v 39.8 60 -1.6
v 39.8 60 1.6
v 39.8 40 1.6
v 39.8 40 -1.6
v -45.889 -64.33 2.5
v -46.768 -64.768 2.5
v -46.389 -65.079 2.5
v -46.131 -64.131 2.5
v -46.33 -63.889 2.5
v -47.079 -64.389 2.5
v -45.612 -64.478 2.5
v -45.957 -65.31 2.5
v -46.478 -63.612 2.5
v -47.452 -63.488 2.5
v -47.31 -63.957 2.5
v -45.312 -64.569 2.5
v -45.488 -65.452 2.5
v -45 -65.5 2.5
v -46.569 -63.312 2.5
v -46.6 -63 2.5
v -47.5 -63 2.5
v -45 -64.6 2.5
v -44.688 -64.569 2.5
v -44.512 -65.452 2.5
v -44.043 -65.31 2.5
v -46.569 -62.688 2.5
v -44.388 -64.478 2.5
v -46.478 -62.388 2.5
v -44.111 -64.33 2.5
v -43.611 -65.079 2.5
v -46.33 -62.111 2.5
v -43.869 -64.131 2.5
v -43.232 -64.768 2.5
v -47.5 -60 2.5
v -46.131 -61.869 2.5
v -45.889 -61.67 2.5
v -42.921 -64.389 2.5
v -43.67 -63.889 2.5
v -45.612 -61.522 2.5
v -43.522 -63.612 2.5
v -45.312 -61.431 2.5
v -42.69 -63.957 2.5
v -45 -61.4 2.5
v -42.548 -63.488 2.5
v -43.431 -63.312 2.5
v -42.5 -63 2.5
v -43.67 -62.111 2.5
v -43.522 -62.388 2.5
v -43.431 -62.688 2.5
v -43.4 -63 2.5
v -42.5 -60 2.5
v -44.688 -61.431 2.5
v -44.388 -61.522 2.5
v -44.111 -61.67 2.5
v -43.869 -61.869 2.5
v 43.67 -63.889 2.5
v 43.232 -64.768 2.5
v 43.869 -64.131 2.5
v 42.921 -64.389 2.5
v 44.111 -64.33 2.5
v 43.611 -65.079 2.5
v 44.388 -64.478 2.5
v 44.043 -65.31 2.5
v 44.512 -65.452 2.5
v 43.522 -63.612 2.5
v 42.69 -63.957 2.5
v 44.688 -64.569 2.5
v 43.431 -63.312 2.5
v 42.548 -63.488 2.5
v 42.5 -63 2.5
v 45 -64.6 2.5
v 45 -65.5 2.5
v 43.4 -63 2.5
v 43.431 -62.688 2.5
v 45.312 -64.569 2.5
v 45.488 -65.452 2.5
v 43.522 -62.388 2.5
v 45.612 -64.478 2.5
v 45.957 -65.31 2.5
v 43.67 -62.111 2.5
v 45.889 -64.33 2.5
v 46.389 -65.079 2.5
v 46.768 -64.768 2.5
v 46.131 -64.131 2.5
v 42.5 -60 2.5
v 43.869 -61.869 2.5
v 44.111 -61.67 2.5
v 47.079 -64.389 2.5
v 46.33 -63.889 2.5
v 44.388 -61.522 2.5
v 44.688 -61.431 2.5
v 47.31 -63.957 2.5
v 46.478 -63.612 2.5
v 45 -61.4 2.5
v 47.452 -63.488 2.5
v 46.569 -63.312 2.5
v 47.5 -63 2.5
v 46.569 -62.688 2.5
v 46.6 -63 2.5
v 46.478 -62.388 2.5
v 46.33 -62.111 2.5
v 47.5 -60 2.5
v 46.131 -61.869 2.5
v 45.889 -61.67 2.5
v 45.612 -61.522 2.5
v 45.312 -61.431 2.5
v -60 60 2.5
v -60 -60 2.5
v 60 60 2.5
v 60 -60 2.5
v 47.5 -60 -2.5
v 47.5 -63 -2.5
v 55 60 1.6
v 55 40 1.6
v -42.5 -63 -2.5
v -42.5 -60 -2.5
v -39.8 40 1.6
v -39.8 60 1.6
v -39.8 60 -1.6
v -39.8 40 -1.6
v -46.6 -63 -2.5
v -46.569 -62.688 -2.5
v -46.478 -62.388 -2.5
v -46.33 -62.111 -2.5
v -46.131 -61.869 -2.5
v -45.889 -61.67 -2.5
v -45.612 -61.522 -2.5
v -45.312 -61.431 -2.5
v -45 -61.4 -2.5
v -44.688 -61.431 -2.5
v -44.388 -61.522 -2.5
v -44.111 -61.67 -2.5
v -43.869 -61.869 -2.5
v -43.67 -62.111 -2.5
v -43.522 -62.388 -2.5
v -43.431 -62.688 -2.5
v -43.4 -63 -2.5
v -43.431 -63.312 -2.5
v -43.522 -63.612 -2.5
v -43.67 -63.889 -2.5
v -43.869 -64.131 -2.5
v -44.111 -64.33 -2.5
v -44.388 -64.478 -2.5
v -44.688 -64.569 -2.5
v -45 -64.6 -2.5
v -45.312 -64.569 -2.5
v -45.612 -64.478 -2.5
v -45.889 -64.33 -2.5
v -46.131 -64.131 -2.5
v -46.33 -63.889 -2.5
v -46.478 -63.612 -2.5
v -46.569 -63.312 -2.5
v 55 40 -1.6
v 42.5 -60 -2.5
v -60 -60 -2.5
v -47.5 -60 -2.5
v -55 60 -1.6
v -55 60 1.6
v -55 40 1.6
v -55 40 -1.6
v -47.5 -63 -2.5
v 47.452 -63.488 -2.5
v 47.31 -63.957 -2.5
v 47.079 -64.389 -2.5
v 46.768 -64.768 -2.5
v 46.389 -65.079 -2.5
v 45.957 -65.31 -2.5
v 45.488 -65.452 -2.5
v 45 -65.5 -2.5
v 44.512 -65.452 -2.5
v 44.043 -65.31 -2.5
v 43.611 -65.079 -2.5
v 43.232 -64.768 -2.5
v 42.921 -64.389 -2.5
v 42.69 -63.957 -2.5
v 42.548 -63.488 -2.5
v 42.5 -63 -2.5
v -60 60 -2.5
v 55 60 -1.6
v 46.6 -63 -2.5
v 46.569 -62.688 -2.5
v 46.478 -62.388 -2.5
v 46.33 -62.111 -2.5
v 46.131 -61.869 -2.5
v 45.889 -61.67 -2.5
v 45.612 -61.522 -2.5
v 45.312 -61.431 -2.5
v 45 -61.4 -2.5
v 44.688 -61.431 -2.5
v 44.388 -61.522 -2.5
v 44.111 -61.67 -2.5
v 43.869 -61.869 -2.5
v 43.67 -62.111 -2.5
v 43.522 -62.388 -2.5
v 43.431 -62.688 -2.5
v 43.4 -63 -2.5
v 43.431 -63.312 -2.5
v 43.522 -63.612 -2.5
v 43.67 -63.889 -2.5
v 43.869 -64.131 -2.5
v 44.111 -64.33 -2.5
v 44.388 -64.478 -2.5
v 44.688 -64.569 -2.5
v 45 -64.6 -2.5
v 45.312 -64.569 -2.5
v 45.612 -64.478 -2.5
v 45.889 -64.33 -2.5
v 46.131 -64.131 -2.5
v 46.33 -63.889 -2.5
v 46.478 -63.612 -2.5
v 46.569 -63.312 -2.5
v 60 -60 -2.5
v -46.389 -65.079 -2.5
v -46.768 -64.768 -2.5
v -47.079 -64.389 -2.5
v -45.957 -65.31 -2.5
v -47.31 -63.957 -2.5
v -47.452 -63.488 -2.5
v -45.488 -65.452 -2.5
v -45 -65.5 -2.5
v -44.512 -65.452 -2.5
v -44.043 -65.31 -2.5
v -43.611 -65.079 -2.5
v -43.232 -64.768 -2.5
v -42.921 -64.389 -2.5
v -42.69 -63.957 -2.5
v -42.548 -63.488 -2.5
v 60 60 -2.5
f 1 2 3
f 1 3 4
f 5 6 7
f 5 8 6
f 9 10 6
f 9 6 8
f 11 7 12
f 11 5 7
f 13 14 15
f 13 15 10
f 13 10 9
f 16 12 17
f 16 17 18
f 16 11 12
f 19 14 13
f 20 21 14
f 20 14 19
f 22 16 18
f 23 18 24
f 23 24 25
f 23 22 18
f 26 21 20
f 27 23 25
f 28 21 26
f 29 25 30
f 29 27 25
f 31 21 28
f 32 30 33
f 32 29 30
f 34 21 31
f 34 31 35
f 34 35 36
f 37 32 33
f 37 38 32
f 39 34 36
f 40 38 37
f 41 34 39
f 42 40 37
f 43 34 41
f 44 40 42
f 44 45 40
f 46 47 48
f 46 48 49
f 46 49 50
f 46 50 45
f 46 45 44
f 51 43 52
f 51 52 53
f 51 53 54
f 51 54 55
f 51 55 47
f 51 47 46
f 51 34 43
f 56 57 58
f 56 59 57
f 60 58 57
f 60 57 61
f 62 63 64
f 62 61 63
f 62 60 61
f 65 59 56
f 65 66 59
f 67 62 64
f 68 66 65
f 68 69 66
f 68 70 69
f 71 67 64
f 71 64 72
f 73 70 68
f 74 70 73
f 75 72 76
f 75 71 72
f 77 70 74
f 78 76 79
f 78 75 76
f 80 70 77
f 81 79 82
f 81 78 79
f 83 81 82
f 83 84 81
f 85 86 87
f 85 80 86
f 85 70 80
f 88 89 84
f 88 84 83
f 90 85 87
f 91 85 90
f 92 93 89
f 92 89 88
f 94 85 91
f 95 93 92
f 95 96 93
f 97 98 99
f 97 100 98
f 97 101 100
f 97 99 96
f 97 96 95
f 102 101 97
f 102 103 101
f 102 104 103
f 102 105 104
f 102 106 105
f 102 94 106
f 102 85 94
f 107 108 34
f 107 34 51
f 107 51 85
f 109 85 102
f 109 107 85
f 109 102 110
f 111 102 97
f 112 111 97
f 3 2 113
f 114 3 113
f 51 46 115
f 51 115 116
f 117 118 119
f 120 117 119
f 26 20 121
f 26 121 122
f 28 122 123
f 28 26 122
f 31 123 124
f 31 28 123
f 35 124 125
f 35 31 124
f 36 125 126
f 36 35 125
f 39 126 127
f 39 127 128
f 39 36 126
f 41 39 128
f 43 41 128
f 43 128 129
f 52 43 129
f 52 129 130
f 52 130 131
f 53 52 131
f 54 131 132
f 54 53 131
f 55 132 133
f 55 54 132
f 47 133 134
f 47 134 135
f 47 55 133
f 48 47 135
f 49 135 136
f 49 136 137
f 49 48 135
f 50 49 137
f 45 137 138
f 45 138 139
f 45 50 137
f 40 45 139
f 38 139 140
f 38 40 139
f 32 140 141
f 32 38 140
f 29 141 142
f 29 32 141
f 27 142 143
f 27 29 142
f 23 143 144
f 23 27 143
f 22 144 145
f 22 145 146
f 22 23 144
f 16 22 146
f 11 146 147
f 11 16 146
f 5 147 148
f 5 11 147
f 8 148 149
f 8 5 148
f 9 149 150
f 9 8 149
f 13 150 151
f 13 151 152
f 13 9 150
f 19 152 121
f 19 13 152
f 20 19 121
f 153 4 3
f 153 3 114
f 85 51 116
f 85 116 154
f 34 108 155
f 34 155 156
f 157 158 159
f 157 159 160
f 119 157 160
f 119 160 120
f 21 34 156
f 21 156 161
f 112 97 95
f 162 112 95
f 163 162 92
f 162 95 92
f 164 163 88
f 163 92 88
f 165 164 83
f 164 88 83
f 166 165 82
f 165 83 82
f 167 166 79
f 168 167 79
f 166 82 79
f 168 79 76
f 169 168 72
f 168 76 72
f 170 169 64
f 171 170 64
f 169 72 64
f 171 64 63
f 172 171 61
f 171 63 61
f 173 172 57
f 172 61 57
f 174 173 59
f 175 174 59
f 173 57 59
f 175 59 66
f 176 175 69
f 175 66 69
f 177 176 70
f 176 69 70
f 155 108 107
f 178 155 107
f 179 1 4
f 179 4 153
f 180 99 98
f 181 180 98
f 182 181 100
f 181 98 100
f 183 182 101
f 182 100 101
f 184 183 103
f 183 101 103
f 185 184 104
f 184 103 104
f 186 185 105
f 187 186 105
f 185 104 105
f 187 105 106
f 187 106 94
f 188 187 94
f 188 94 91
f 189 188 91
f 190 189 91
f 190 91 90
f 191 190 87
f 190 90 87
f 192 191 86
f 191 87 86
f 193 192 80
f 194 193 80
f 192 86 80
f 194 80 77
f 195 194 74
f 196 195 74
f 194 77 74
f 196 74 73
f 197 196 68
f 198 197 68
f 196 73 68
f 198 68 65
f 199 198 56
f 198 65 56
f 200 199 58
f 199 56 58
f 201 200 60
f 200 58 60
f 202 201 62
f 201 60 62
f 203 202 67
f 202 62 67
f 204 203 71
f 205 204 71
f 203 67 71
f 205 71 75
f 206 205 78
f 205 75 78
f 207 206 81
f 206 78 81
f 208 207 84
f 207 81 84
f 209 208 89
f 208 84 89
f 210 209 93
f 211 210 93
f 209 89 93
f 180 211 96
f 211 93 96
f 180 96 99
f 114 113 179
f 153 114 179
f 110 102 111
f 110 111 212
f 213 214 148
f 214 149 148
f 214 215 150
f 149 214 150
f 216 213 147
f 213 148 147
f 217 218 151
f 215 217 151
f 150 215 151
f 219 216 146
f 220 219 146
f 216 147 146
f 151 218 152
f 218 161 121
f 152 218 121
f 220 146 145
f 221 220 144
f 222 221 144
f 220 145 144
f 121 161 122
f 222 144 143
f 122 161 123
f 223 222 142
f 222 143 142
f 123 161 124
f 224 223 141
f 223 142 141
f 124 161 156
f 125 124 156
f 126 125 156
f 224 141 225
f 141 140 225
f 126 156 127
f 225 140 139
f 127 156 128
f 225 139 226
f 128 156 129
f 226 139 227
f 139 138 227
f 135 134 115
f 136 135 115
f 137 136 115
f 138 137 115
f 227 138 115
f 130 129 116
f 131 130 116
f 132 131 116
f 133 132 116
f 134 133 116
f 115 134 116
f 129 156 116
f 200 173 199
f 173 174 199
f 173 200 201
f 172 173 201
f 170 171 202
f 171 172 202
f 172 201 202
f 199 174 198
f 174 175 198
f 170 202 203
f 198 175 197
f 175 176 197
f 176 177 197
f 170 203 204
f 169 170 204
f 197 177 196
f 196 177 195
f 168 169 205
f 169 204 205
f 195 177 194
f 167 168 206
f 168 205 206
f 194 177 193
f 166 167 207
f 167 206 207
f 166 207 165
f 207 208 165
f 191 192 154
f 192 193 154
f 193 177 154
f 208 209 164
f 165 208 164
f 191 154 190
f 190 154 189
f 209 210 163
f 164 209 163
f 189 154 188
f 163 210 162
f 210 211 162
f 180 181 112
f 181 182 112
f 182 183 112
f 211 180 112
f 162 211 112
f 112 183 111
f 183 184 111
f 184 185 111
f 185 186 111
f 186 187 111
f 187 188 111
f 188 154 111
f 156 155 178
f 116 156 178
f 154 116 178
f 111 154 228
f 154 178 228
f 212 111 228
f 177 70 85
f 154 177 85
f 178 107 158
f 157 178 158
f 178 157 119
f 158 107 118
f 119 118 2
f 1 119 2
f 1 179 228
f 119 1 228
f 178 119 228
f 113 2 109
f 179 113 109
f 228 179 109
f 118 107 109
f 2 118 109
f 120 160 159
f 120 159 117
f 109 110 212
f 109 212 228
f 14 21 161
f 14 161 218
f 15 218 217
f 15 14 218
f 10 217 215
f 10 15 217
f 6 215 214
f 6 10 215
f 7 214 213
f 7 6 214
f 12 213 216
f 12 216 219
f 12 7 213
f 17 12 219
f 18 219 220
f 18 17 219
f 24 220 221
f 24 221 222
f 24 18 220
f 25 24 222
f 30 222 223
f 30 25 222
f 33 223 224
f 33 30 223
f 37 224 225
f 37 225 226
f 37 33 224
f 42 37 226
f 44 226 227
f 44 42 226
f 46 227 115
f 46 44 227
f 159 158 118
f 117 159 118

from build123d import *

# Parameters (mm, degrees)
SKETCH1_W           = 120
SKETCH1_H           = 120
BOSS_EXTRUDE1_DEPTH = 2.5
SKETCH4_W           = 15.2
SKETCH4_H           = 3.2
CUT_EXTRUDE1_DEPTH  = 20
SKETCH6_R           = 1.6
BOSS_EXTRUDE2_DEPTH = 5


with BuildPart() as part:
    # Sketch1 → Boss-Extrude1 (new, symmetric)
    with BuildSketch(Plane.XY):
        Rectangle(SKETCH1_W, SKETCH1_H)
    extrude(amount=BOSS_EXTRUDE1_DEPTH, both=True)

    # Sketch4 → Cut-Extrude1 (cut)
    with BuildSketch(Plane(origin=(0, 60, 0), x_dir=(1, 0, 0), z_dir=(0, 1, 0))):
        with Locations((-47.4, 0)):
            Rectangle(SKETCH4_W, SKETCH4_H)
        with Locations((47.4, 0)):
            Rectangle(SKETCH4_W, SKETCH4_H)
    extrude(amount=-CUT_EXTRUDE1_DEPTH, mode=Mode.SUBTRACT)

    # Sketch6 → Boss-Extrude2 (add)
    with BuildSketch(Plane.XY.offset(2.5)):
        with BuildLine():
            Line((42.5, -60), (47.5, -60))
            Line((47.5, -60), (47.5, -63))
            ThreePointArc((47.5, -63), (45, -65.5), (42.5, -63))
            Line((42.5, -63), (42.5, -60))
        make_face()
        with Locations((45, -63)):
            Circle(SKETCH6_R, mode=Mode.SUBTRACT)
    boss_extrude2 = extrude(amount=-BOSS_EXTRUDE2_DEPTH)

    # Mirror1: Boss-Extrude2 across plane
    add(boss_extrude2.mirror(Plane(origin=(0, 0, 0), x_dir=(0, 0, 1), z_dir=(1, 0, 0))))


solid = part.part
